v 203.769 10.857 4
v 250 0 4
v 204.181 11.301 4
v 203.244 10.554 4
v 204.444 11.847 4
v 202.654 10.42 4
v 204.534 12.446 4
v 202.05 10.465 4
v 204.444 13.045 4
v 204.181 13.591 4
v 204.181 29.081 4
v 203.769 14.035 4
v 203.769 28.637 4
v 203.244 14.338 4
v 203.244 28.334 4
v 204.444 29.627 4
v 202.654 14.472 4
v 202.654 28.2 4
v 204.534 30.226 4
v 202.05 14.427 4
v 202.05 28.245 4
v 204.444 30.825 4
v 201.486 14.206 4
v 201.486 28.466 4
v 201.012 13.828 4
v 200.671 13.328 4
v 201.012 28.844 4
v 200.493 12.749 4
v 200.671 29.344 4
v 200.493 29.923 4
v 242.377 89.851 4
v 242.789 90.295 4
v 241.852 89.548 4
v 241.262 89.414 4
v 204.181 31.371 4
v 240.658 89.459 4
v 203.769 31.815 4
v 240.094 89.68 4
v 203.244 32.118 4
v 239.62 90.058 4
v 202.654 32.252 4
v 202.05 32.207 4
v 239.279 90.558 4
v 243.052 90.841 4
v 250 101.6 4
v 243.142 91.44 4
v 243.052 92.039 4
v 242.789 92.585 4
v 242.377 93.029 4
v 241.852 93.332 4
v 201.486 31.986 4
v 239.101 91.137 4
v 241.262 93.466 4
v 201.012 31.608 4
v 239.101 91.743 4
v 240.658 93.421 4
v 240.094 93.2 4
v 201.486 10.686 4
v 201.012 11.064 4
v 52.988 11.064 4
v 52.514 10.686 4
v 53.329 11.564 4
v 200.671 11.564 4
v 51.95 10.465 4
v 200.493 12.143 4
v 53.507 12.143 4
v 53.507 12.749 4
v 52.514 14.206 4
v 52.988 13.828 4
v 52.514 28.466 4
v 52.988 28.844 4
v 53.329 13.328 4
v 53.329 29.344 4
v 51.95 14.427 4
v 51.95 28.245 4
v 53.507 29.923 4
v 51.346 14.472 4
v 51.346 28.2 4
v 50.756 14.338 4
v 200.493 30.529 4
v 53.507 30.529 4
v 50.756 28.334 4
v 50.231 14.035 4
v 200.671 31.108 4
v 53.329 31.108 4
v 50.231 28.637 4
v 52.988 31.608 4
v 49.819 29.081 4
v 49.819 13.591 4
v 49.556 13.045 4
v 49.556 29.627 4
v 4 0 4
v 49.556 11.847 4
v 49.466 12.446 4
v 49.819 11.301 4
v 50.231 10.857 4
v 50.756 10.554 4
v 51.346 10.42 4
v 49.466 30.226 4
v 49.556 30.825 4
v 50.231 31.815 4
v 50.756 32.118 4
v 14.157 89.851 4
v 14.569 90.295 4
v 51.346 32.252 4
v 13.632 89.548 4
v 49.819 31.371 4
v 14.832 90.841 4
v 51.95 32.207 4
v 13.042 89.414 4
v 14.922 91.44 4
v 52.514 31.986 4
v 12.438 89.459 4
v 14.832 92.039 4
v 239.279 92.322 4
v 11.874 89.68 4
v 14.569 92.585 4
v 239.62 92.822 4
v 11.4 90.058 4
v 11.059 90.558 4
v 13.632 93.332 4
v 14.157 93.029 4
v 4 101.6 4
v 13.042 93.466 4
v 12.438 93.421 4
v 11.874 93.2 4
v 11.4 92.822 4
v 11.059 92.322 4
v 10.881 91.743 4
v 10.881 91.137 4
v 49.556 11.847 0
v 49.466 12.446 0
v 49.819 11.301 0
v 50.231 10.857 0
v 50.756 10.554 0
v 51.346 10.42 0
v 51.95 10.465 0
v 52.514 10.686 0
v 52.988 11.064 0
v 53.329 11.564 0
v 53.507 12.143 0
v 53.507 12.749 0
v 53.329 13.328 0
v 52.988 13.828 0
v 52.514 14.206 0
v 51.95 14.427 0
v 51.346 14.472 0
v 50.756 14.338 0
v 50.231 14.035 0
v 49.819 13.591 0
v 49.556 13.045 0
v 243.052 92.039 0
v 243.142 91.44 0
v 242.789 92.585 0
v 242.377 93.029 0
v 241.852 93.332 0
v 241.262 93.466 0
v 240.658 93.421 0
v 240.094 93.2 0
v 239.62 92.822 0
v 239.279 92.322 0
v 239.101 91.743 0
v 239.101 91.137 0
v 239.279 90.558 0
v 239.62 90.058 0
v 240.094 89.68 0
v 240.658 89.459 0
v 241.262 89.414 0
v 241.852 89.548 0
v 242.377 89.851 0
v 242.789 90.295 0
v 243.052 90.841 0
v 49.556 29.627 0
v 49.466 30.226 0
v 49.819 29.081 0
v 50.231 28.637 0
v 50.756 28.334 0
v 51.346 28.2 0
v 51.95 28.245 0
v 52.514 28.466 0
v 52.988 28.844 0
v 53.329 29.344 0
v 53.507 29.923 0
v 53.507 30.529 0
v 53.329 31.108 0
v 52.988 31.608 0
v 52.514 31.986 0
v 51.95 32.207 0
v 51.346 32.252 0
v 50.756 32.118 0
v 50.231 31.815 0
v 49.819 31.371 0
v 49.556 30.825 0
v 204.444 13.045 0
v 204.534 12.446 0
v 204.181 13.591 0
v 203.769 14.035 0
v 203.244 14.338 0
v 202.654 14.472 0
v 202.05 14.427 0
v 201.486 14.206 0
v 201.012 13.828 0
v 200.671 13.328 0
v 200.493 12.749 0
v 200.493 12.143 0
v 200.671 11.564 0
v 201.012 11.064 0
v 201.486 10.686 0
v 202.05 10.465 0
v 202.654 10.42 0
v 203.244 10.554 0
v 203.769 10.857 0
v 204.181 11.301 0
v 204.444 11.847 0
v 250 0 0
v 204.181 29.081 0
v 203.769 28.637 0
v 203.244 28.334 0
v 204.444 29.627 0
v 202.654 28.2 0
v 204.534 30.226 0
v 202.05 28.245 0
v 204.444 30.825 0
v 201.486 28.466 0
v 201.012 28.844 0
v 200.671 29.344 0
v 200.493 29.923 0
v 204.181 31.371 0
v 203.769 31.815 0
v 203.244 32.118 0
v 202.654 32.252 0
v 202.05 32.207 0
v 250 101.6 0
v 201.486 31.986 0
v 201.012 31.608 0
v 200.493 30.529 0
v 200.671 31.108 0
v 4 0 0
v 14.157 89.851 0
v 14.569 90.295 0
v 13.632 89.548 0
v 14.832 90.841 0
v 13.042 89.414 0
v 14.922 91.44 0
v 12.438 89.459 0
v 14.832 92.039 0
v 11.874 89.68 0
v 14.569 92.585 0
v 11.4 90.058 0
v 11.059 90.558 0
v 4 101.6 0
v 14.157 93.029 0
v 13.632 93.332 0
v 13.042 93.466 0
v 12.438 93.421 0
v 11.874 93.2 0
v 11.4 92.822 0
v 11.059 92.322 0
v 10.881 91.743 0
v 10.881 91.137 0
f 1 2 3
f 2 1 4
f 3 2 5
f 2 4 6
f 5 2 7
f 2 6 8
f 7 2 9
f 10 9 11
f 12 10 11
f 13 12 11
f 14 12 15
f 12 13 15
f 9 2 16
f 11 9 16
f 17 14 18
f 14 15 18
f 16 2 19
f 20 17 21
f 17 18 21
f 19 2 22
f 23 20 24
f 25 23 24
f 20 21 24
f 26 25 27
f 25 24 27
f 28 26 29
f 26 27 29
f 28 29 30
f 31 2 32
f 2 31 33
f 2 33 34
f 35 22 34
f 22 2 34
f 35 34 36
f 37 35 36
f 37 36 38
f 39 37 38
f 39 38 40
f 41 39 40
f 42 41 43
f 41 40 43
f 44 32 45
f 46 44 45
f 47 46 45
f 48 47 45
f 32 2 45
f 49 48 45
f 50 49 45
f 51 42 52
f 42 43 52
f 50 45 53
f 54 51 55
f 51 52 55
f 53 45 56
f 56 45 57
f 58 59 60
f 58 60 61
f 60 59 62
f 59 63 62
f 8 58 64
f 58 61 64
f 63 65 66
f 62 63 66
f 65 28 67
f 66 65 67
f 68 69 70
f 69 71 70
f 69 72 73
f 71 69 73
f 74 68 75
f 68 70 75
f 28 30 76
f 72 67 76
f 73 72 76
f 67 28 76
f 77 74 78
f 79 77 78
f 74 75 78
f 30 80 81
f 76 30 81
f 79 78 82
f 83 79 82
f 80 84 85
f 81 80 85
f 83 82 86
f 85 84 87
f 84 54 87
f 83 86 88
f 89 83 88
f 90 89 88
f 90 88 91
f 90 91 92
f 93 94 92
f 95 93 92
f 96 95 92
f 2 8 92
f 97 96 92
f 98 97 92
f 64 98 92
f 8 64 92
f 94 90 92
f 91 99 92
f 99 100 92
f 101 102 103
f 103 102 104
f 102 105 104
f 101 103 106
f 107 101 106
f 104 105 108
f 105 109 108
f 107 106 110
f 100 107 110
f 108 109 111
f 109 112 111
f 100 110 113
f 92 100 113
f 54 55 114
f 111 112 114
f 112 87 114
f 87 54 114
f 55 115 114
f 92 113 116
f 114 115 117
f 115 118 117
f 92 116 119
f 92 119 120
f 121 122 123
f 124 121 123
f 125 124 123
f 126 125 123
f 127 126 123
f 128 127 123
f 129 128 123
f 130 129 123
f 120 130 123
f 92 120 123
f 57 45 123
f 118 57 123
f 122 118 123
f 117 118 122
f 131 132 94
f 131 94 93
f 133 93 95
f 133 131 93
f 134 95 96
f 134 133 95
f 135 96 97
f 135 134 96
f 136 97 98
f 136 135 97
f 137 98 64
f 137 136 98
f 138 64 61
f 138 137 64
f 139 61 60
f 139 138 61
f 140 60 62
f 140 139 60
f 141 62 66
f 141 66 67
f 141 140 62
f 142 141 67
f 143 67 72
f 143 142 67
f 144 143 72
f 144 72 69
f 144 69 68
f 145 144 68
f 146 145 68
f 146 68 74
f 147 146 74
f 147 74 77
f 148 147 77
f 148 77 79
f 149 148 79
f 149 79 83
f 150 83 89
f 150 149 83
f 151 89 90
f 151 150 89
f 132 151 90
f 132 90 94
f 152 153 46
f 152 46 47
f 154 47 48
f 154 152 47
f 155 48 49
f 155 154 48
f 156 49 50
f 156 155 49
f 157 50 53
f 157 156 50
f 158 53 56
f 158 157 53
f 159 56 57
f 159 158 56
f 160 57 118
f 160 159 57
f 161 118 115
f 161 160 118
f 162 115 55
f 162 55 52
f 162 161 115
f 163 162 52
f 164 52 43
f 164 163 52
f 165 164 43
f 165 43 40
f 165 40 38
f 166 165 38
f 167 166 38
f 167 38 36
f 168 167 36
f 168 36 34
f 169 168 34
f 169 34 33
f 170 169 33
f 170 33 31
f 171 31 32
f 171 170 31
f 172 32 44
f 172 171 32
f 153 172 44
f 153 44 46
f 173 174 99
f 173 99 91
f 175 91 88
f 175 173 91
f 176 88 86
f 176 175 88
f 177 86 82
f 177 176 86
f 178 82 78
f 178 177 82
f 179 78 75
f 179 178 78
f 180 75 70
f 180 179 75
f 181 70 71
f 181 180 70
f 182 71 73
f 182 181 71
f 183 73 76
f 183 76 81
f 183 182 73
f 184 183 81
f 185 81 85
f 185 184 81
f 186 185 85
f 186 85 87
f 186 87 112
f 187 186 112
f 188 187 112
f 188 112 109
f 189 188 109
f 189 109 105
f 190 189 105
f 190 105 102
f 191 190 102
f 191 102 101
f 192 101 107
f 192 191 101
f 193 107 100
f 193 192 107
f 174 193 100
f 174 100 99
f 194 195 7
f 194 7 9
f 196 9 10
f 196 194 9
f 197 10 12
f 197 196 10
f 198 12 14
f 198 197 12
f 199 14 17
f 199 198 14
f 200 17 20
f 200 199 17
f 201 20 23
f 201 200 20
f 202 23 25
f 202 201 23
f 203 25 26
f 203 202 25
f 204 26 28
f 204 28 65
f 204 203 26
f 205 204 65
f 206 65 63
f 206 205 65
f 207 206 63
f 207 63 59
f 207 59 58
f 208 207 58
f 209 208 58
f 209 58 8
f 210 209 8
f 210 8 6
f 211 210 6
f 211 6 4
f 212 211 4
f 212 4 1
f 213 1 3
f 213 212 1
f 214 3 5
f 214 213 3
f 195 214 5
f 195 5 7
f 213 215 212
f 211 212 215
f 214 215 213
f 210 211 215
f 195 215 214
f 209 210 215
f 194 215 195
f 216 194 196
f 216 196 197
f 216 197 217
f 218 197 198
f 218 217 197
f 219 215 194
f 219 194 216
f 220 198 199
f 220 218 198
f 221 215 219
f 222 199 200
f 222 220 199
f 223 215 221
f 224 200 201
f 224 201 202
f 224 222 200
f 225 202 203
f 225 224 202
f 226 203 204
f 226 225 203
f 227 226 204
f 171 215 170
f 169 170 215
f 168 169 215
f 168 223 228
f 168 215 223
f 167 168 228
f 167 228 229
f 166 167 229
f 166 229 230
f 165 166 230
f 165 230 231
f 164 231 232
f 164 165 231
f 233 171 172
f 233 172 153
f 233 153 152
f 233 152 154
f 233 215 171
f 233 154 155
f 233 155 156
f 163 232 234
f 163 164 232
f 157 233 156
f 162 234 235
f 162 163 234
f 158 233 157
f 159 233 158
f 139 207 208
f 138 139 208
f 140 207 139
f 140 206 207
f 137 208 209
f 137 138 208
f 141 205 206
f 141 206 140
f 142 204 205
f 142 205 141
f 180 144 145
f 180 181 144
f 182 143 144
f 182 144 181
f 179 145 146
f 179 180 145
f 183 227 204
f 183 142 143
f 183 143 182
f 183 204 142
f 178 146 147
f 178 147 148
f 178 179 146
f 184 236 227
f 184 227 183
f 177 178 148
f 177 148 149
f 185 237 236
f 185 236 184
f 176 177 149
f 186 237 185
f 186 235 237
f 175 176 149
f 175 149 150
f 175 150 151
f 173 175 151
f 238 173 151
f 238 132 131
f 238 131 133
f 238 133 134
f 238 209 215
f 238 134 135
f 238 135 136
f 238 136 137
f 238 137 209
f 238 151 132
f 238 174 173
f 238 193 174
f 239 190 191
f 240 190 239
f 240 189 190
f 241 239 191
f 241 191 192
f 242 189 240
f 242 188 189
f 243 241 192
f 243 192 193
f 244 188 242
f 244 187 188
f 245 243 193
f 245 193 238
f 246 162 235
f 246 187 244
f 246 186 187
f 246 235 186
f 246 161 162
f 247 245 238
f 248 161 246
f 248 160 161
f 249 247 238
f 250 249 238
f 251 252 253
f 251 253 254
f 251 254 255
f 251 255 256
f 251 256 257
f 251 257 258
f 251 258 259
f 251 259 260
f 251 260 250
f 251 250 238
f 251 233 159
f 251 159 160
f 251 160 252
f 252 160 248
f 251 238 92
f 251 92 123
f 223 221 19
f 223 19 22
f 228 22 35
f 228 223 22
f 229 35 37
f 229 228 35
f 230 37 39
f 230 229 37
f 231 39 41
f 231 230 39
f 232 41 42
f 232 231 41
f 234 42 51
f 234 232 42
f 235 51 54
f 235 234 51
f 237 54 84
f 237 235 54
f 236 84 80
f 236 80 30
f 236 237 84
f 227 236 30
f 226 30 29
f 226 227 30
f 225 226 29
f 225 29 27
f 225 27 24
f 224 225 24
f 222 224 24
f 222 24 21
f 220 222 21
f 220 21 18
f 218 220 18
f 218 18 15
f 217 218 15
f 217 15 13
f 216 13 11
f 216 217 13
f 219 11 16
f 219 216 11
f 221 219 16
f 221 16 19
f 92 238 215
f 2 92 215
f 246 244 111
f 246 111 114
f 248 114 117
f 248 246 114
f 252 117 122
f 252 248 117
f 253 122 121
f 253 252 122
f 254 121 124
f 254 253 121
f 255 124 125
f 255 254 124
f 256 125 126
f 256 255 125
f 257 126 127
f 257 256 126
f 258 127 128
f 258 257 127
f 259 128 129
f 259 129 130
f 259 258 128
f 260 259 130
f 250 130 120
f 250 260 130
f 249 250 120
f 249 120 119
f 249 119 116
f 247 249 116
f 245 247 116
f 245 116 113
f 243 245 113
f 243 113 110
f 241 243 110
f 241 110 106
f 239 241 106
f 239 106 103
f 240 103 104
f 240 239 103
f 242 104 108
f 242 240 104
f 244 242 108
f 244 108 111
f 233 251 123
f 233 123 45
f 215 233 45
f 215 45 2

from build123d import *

# Parameters (mm, degrees)
SKETCH1_R           = 2.032
BOSS_EXTRUDE1_DEPTH = 4


with BuildPart() as part:
    # Sketch1 → Boss-Extrude1 (new body)
    with BuildSketch(Plane.XY):
        Polygon((4, 101.6), (250, 101.6), (250, 0), (127, 0), (4, 0), align=None)
        with Locations(Location((51.498, 12.446, 0), (0, 0, 180))):
            Circle(SKETCH1_R, mode=Mode.SUBTRACT)
        with Locations(Location((51.498, 30.226, 0), (0, 0, 180))):
            Circle(SKETCH1_R, mode=Mode.SUBTRACT)
        with Locations((202.502, 30.226)):
            Circle(SKETCH1_R, mode=Mode.SUBTRACT)
        with Locations((202.502, 12.446)):
            Circle(SKETCH1_R, mode=Mode.SUBTRACT)
        with Locations((241.11, 91.44)):
            Circle(SKETCH1_R, mode=Mode.SUBTRACT)
        with Locations((12.89, 91.44)):
            Circle(SKETCH1_R, mode=Mode.SUBTRACT)
    extrude(amount=BOSS_EXTRUDE1_DEPTH)


solid = part.part
